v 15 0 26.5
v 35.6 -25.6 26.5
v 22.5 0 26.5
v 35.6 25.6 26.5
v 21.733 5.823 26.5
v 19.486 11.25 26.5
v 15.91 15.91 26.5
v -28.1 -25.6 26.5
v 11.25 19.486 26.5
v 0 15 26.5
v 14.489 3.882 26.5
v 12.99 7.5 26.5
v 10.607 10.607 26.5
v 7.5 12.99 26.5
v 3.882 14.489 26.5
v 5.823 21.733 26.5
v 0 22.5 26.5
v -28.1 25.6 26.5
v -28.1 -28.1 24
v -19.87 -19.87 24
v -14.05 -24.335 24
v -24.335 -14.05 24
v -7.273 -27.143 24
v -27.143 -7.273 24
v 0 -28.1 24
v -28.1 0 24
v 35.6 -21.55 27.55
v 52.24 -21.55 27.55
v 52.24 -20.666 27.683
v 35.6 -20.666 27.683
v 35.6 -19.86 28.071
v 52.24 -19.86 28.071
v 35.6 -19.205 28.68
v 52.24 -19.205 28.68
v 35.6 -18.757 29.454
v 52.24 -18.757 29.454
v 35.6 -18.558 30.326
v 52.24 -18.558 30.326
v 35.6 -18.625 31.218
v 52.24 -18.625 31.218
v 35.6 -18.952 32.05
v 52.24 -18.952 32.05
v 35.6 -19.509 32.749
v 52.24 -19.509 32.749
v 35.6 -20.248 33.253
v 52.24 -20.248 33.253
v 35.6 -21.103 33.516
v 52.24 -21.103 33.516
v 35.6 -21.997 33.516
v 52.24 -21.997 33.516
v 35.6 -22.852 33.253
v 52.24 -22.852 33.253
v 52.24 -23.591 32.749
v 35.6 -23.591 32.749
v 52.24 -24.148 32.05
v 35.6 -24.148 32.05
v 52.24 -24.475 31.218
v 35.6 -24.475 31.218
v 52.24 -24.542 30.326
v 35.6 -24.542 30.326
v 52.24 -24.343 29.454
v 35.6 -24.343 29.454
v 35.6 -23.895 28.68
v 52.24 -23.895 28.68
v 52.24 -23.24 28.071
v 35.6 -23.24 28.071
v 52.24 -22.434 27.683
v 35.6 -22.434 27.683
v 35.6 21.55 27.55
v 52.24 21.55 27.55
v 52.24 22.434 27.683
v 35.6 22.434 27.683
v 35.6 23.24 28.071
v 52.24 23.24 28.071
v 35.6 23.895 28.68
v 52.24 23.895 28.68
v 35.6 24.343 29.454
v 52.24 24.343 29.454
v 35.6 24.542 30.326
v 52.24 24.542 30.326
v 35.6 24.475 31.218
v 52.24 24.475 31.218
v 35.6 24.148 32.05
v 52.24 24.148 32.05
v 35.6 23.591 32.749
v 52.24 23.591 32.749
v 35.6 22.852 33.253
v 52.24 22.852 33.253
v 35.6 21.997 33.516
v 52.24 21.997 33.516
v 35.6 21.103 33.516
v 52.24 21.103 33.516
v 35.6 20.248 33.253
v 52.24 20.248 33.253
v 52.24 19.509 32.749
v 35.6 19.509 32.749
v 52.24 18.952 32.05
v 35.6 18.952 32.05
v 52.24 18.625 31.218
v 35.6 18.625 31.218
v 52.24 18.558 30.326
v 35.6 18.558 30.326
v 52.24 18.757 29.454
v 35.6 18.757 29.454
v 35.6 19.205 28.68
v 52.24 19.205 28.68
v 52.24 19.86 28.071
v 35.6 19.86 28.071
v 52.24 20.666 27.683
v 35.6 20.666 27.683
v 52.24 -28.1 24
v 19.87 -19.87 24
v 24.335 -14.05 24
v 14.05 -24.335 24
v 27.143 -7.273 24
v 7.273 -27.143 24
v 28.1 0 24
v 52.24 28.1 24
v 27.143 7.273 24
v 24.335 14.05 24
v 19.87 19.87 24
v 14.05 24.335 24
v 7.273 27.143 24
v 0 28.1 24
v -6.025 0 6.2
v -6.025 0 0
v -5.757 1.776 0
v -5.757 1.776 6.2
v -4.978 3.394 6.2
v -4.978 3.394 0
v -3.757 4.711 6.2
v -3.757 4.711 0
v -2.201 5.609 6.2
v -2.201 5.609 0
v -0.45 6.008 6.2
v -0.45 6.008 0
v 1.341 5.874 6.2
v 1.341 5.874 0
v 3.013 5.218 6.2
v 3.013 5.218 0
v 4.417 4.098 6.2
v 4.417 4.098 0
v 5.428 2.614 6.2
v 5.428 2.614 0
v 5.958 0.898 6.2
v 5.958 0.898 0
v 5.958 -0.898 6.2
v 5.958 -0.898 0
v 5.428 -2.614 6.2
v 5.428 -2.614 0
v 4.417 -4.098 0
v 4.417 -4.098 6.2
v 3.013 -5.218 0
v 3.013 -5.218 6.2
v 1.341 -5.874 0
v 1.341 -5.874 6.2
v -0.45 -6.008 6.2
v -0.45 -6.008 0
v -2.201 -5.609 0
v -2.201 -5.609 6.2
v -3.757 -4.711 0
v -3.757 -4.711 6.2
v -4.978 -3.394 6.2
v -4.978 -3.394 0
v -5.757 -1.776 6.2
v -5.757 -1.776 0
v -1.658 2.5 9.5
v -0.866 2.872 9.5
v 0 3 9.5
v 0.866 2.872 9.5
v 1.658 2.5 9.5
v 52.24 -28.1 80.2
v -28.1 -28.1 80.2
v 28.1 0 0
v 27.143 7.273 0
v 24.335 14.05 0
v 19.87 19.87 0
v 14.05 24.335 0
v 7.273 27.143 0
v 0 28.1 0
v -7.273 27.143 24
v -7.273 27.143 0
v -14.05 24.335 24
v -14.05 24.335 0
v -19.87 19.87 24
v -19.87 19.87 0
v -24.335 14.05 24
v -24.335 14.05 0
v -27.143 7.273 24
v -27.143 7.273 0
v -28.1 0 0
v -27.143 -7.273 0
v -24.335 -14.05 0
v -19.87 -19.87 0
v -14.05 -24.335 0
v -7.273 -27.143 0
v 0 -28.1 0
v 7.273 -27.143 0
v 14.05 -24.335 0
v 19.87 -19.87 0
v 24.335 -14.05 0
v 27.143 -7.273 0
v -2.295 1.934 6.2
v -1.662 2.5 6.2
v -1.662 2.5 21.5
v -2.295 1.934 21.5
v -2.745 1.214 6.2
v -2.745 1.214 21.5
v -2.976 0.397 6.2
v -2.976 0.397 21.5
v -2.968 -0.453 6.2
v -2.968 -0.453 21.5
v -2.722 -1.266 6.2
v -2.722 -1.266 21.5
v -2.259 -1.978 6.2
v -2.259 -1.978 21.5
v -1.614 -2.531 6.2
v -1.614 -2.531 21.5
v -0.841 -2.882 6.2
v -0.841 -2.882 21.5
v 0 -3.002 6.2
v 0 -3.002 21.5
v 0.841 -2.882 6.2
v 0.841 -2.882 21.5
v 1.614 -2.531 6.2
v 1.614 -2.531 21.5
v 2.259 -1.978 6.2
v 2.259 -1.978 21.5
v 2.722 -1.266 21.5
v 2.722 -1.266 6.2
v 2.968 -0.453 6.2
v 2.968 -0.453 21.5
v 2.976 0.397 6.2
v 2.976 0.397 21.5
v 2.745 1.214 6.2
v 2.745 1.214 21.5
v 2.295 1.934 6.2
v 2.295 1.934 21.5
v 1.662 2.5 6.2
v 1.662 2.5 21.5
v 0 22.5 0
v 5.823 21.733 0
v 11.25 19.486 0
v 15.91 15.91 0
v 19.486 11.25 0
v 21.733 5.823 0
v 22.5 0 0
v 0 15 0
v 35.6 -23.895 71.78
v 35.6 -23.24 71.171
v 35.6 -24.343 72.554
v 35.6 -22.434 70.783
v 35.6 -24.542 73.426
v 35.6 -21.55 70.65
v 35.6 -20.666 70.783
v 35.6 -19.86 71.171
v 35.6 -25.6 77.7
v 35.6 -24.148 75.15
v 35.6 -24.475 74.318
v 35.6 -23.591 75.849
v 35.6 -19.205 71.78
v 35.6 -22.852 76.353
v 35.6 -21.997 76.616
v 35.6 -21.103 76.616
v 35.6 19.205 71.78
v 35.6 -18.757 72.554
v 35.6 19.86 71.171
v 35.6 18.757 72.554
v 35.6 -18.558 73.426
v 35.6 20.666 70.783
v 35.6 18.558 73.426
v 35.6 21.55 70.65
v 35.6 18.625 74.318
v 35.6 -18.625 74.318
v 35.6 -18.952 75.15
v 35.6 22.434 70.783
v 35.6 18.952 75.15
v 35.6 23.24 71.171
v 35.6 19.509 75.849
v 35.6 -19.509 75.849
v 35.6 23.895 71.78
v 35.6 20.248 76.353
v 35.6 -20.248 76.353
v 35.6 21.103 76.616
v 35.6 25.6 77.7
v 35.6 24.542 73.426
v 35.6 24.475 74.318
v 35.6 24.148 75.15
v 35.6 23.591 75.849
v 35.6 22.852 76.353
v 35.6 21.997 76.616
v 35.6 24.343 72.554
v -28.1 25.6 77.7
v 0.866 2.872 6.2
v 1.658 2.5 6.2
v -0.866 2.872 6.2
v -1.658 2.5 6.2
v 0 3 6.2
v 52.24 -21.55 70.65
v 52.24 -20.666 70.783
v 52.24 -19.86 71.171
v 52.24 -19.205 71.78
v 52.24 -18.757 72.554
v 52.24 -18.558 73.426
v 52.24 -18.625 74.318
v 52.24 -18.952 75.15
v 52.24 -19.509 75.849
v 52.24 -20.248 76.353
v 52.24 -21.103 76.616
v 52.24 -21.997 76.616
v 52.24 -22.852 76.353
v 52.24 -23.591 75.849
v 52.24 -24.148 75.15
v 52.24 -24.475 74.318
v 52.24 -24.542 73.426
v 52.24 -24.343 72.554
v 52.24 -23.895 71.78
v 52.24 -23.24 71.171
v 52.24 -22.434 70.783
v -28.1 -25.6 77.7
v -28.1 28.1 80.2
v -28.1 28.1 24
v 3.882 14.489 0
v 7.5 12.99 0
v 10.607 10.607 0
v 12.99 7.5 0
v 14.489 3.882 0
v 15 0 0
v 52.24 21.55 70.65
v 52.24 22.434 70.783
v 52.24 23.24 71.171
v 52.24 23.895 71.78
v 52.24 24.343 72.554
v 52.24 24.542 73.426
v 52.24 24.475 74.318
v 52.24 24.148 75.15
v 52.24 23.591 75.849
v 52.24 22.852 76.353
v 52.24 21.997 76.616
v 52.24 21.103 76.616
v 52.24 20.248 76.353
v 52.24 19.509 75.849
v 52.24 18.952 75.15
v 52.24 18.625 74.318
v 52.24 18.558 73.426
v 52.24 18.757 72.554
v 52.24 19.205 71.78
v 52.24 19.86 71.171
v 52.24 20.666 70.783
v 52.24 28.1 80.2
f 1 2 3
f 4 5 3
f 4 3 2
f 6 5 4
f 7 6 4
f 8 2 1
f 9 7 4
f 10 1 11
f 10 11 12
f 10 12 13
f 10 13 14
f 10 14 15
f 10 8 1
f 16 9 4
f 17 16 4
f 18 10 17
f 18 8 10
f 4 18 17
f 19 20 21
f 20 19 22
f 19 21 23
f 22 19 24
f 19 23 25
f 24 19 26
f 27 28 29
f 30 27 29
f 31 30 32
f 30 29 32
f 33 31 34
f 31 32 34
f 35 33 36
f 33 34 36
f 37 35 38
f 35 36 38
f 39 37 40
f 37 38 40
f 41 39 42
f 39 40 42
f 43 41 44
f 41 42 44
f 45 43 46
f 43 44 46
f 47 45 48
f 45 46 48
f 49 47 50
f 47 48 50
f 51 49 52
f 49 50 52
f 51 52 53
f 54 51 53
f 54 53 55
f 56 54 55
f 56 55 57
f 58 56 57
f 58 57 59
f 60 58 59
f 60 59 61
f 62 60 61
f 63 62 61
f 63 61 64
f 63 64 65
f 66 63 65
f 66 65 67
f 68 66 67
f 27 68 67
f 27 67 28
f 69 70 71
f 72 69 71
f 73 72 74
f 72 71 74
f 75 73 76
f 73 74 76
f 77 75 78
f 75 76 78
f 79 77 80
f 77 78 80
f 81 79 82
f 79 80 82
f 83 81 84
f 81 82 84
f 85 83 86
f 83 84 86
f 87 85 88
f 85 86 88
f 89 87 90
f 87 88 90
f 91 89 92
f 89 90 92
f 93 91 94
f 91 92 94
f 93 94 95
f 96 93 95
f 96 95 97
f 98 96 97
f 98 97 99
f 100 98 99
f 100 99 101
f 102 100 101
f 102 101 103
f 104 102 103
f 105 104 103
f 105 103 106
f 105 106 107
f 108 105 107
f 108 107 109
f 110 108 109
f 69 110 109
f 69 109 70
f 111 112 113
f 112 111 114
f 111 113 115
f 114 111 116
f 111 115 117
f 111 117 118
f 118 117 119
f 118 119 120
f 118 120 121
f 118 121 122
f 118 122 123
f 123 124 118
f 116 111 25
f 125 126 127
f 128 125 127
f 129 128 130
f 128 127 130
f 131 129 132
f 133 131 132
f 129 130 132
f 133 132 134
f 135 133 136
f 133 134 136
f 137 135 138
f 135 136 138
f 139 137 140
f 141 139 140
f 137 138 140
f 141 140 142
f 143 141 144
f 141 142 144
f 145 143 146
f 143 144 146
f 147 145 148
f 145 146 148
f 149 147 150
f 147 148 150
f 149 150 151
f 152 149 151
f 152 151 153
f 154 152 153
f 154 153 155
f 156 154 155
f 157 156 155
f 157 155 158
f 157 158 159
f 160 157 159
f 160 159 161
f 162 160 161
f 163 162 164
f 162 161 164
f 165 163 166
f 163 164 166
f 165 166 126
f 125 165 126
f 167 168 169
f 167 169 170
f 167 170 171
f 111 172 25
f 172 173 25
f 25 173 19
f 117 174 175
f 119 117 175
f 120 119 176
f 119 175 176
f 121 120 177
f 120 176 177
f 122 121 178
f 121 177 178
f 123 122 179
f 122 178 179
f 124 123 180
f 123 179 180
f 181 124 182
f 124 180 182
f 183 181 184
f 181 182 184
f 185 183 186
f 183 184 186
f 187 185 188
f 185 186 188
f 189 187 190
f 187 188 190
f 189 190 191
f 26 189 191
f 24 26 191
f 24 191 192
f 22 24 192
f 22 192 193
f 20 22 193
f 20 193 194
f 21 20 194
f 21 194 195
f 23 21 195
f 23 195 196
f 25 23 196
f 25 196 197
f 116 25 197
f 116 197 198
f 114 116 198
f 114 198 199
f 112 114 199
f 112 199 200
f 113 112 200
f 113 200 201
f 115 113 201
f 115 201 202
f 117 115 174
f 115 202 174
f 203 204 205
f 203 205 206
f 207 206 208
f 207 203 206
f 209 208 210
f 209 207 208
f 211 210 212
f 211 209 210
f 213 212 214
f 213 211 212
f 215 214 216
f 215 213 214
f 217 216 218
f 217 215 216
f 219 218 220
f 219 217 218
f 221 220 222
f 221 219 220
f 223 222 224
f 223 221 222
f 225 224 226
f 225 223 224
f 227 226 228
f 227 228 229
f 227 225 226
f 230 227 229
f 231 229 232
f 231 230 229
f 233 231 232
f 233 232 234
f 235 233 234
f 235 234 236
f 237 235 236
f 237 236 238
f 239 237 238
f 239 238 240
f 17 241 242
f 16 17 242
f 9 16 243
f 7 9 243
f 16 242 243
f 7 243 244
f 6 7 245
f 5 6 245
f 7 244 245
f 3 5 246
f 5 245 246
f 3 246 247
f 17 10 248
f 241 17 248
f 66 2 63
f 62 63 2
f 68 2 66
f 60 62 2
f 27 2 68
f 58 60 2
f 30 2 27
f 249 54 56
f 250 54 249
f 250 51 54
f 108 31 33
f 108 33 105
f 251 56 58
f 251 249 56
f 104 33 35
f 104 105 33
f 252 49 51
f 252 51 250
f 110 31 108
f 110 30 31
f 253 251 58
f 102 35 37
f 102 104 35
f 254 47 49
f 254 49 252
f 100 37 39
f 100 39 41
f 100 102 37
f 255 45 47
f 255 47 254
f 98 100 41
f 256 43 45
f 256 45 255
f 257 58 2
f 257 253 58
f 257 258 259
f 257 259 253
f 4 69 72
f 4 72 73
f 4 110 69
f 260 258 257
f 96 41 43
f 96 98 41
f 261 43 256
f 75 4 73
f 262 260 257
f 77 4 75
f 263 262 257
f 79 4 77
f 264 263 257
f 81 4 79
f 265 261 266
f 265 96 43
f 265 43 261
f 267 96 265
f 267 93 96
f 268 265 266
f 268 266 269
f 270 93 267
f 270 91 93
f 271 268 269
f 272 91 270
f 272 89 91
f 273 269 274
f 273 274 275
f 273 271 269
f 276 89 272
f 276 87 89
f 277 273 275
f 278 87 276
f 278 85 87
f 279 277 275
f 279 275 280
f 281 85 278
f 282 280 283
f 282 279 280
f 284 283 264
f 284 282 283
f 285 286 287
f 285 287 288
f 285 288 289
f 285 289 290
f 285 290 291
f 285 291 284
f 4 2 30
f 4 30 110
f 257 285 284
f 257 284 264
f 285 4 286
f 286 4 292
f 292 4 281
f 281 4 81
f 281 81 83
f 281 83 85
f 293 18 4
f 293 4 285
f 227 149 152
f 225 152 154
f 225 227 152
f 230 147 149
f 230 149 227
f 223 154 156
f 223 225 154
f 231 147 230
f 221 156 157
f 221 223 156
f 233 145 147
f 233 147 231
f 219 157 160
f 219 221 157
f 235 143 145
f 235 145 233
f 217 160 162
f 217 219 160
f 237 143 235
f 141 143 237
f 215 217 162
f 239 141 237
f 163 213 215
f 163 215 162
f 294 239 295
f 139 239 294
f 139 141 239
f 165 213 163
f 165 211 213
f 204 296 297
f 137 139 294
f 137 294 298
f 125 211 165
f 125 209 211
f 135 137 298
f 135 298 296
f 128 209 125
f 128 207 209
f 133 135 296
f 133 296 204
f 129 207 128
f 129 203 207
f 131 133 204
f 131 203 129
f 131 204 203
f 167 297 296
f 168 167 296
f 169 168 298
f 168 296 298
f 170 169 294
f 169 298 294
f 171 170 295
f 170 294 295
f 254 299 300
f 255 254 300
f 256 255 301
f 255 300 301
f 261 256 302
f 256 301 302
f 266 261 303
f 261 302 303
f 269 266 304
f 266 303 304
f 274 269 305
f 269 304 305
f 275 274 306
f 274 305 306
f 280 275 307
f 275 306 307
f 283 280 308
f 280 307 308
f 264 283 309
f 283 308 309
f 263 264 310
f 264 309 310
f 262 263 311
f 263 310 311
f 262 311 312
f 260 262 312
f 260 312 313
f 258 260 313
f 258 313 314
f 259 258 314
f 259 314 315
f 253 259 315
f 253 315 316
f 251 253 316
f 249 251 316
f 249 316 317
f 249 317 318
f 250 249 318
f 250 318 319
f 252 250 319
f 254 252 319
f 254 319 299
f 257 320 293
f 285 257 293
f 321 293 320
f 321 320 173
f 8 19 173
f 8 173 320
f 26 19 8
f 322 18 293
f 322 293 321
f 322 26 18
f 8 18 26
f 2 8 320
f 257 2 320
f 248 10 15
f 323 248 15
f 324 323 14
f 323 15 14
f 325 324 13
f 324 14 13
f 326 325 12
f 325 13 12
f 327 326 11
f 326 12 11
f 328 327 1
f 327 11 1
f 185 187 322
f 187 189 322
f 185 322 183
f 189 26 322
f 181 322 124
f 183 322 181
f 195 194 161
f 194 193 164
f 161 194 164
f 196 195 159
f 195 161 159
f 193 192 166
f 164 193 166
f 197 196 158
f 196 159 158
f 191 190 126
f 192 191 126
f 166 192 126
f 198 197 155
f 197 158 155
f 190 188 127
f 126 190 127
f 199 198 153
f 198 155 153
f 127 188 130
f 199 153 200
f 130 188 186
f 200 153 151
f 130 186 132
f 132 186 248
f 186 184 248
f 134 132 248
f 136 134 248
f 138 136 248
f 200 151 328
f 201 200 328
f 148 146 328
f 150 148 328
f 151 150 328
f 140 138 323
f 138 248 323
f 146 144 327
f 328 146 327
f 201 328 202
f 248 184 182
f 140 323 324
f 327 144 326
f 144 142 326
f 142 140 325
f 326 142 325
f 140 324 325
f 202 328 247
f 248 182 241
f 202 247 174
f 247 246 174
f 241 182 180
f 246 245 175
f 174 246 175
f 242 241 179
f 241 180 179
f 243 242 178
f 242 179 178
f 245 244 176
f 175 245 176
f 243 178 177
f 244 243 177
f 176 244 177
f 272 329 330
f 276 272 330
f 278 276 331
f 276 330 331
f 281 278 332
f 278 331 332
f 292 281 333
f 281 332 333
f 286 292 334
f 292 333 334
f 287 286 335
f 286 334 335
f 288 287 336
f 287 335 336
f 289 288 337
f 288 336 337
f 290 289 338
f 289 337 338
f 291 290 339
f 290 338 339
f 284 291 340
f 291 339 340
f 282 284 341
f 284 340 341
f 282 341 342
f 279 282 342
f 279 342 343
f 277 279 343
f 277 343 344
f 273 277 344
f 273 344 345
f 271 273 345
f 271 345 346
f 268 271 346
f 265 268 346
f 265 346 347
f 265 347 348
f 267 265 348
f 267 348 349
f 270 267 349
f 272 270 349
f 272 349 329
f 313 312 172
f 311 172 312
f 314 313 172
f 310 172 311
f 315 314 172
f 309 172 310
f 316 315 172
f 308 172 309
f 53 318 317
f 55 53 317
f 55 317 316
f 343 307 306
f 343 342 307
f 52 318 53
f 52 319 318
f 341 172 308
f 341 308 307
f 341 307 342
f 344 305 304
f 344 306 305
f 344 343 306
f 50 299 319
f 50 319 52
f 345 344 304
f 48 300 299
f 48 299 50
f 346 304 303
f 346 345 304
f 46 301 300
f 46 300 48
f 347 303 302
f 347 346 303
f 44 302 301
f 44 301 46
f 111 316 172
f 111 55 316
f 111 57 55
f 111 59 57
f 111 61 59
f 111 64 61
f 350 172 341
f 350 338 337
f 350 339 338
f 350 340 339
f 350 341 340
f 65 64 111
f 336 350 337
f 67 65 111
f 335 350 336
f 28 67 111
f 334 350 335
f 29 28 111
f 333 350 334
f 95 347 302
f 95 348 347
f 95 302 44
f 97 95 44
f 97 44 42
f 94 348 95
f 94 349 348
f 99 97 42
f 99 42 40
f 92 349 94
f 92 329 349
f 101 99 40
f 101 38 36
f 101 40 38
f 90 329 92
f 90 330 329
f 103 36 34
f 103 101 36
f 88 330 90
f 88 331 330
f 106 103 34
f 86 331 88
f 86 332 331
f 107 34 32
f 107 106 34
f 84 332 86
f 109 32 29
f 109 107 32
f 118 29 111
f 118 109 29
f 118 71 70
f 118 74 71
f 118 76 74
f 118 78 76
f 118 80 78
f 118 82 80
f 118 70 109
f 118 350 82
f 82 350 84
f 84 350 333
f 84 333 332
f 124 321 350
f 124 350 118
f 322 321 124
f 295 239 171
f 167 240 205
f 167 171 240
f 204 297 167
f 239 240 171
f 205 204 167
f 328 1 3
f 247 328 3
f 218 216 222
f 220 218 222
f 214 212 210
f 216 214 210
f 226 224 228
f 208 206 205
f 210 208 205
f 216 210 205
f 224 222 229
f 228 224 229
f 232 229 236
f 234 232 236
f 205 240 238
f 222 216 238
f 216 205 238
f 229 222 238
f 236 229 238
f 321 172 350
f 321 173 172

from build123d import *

# Parameters (mm, degrees)
SKETCH1_R           = 28.1
BOSS_EXTRUDE2_DEPTH = 24
CUT_EXTRUDE2_DEPTH  = 21.5
SKETCH4_R           = 3
CUT_EXTRUDE3_DEPTH  = 9.5
SKETCH6_R           = 6.025
CUT_EXTRUDE4_DEPTH  = 6.2
SKETCH7_W           = 56.2
SKETCH7_H           = 56.2
BOSS_EXTRUDE3_DEPTH = 56.2
SKETCH8_W           = 56.2
SKETCH8_H           = 56.2
BOSS_EXTRUDE4_DEPTH = 14.14
SKETCH10_W          = 56.2
SKETCH10_H          = 56.2
BOSS_EXTRUDE5_DEPTH = 10
SKETCH19_W          = 51.2
SKETCH19_H          = 51.2
CUT_EXTRUDE5_DEPTH  = 63.7
SKETCH21_R          = 3
CUT_EXTRUDE7_DEPTH  = 20


with BuildPart() as part:
    # Sketch1 → Boss-Extrude2 (new body)
    with BuildSketch(Plane.XY):
        Circle(SKETCH1_R)
    extrude(amount=BOSS_EXTRUDE2_DEPTH)

    # Sketch3 → Cut-Extrude2 (cut)
    with BuildSketch(Plane(origin=(0, 0, 0), x_dir=(-1, 0, 0), z_dir=(0, 0, -1))):
        with BuildLine():
            Line((-1.661801922, 2.5), (1.661801922, 2.5))
            ThreePointArc((1.661801922, 2.5), (0, -3.001930317), (-1.661801922, 2.5))
        make_face()
    extrude(amount=-CUT_EXTRUDE2_DEPTH, mode=Mode.SUBTRACT)

    # Sketch4 → Cut-Extrude3 (cut)
    with BuildSketch(Plane(origin=(0, 0, 0), x_dir=(-1, 0, 0), z_dir=(0, 0, -1))):
        Circle(SKETCH4_R)
    extrude(amount=-CUT_EXTRUDE3_DEPTH, mode=Mode.SUBTRACT)

    # Sketch6 → Cut-Extrude4 (cut)
    with BuildSketch(Plane(origin=(0, 0, 0), x_dir=(-1, 0, 0), z_dir=(0, 0, -1))):
        Circle(SKETCH6_R)
    extrude(amount=-CUT_EXTRUDE4_DEPTH, mode=Mode.SUBTRACT)

    # Sketch7 → Boss-Extrude3 (add)
    with BuildSketch(Plane.XY.offset(24)):
        Rectangle(SKETCH7_W, SKETCH7_H)
    extrude(amount=BOSS_EXTRUDE3_DEPTH)

    # Sketch8 → Boss-Extrude4 (add)
    with BuildSketch(Plane(origin=(28.1, 0, 0), x_dir=(0, 0, -1), z_dir=(1, 0, 0))):
        with Locations((-52.1, 0)):
            Rectangle(SKETCH8_W, SKETCH8_H)
    extrude(amount=BOSS_EXTRUDE4_DEPTH)

    # Sketch10 → Boss-Extrude5 (add)
    with BuildSketch(Plane(origin=(42.24, 0, 0), x_dir=(0, 0, -1), z_dir=(1, 0, 0))):
        with Locations((-52.1, 0)):
            Rectangle(SKETCH10_W, SKETCH10_H)
    extrude(amount=BOSS_EXTRUDE5_DEPTH)

    # Sketch19 → Cut-Extrude5 (cut)
    with BuildSketch(Plane.ZY.offset(28.1)):
        with Locations((52.1, 0)):
            Rectangle(SKETCH19_W, SKETCH19_H)
    extrude(amount=-CUT_EXTRUDE5_DEPTH, mode=Mode.SUBTRACT)

    # Cut-Sweep2: sweep along a path in Sketch20
    with BuildLine(Plane(origin=(0, 0, 0), x_dir=(-1, 0, 0), z_dir=(0, 0, -1))) as cut_sweep2_path:
        ThreePointArc((0, 15), (-10.606601718, 10.606601718), (-15, 0))
    # 3DSketch2 → Cut-Sweep2 (sweep, cut)
    with BuildSketch(Plane(origin=(0, 15, 0), x_dir=(0, 0.17521220324553322, 0.9845306921746249), z_dir=(-1, 0, 0))):
        Polygon((0, 0), (1.314091524, 7.383980191), (42.805237655, 0), (41.491146131, -7.383980191), align=None)
    sweep(path=cut_sweep2_path.line, mode=Mode.SUBTRACT)

    # Sketch21 → Cut-Extrude7 (cut)
    with BuildSketch(Plane(origin=(52.24, 0, 0), x_dir=(0, 0, -1), z_dir=(1, 0, 0))):
        with Locations((-73.65, 21.55)):
            Circle(SKETCH21_R)
        with Locations((-30.55, 21.55)):
            Circle(SKETCH21_R)
        with Locations((-30.55, -21.55)):
            Circle(SKETCH21_R)
        with Locations((-73.65, -21.55)):
            Circle(SKETCH21_R)
    extrude(amount=-CUT_EXTRUDE7_DEPTH, mode=Mode.SUBTRACT)


solid = part.part
